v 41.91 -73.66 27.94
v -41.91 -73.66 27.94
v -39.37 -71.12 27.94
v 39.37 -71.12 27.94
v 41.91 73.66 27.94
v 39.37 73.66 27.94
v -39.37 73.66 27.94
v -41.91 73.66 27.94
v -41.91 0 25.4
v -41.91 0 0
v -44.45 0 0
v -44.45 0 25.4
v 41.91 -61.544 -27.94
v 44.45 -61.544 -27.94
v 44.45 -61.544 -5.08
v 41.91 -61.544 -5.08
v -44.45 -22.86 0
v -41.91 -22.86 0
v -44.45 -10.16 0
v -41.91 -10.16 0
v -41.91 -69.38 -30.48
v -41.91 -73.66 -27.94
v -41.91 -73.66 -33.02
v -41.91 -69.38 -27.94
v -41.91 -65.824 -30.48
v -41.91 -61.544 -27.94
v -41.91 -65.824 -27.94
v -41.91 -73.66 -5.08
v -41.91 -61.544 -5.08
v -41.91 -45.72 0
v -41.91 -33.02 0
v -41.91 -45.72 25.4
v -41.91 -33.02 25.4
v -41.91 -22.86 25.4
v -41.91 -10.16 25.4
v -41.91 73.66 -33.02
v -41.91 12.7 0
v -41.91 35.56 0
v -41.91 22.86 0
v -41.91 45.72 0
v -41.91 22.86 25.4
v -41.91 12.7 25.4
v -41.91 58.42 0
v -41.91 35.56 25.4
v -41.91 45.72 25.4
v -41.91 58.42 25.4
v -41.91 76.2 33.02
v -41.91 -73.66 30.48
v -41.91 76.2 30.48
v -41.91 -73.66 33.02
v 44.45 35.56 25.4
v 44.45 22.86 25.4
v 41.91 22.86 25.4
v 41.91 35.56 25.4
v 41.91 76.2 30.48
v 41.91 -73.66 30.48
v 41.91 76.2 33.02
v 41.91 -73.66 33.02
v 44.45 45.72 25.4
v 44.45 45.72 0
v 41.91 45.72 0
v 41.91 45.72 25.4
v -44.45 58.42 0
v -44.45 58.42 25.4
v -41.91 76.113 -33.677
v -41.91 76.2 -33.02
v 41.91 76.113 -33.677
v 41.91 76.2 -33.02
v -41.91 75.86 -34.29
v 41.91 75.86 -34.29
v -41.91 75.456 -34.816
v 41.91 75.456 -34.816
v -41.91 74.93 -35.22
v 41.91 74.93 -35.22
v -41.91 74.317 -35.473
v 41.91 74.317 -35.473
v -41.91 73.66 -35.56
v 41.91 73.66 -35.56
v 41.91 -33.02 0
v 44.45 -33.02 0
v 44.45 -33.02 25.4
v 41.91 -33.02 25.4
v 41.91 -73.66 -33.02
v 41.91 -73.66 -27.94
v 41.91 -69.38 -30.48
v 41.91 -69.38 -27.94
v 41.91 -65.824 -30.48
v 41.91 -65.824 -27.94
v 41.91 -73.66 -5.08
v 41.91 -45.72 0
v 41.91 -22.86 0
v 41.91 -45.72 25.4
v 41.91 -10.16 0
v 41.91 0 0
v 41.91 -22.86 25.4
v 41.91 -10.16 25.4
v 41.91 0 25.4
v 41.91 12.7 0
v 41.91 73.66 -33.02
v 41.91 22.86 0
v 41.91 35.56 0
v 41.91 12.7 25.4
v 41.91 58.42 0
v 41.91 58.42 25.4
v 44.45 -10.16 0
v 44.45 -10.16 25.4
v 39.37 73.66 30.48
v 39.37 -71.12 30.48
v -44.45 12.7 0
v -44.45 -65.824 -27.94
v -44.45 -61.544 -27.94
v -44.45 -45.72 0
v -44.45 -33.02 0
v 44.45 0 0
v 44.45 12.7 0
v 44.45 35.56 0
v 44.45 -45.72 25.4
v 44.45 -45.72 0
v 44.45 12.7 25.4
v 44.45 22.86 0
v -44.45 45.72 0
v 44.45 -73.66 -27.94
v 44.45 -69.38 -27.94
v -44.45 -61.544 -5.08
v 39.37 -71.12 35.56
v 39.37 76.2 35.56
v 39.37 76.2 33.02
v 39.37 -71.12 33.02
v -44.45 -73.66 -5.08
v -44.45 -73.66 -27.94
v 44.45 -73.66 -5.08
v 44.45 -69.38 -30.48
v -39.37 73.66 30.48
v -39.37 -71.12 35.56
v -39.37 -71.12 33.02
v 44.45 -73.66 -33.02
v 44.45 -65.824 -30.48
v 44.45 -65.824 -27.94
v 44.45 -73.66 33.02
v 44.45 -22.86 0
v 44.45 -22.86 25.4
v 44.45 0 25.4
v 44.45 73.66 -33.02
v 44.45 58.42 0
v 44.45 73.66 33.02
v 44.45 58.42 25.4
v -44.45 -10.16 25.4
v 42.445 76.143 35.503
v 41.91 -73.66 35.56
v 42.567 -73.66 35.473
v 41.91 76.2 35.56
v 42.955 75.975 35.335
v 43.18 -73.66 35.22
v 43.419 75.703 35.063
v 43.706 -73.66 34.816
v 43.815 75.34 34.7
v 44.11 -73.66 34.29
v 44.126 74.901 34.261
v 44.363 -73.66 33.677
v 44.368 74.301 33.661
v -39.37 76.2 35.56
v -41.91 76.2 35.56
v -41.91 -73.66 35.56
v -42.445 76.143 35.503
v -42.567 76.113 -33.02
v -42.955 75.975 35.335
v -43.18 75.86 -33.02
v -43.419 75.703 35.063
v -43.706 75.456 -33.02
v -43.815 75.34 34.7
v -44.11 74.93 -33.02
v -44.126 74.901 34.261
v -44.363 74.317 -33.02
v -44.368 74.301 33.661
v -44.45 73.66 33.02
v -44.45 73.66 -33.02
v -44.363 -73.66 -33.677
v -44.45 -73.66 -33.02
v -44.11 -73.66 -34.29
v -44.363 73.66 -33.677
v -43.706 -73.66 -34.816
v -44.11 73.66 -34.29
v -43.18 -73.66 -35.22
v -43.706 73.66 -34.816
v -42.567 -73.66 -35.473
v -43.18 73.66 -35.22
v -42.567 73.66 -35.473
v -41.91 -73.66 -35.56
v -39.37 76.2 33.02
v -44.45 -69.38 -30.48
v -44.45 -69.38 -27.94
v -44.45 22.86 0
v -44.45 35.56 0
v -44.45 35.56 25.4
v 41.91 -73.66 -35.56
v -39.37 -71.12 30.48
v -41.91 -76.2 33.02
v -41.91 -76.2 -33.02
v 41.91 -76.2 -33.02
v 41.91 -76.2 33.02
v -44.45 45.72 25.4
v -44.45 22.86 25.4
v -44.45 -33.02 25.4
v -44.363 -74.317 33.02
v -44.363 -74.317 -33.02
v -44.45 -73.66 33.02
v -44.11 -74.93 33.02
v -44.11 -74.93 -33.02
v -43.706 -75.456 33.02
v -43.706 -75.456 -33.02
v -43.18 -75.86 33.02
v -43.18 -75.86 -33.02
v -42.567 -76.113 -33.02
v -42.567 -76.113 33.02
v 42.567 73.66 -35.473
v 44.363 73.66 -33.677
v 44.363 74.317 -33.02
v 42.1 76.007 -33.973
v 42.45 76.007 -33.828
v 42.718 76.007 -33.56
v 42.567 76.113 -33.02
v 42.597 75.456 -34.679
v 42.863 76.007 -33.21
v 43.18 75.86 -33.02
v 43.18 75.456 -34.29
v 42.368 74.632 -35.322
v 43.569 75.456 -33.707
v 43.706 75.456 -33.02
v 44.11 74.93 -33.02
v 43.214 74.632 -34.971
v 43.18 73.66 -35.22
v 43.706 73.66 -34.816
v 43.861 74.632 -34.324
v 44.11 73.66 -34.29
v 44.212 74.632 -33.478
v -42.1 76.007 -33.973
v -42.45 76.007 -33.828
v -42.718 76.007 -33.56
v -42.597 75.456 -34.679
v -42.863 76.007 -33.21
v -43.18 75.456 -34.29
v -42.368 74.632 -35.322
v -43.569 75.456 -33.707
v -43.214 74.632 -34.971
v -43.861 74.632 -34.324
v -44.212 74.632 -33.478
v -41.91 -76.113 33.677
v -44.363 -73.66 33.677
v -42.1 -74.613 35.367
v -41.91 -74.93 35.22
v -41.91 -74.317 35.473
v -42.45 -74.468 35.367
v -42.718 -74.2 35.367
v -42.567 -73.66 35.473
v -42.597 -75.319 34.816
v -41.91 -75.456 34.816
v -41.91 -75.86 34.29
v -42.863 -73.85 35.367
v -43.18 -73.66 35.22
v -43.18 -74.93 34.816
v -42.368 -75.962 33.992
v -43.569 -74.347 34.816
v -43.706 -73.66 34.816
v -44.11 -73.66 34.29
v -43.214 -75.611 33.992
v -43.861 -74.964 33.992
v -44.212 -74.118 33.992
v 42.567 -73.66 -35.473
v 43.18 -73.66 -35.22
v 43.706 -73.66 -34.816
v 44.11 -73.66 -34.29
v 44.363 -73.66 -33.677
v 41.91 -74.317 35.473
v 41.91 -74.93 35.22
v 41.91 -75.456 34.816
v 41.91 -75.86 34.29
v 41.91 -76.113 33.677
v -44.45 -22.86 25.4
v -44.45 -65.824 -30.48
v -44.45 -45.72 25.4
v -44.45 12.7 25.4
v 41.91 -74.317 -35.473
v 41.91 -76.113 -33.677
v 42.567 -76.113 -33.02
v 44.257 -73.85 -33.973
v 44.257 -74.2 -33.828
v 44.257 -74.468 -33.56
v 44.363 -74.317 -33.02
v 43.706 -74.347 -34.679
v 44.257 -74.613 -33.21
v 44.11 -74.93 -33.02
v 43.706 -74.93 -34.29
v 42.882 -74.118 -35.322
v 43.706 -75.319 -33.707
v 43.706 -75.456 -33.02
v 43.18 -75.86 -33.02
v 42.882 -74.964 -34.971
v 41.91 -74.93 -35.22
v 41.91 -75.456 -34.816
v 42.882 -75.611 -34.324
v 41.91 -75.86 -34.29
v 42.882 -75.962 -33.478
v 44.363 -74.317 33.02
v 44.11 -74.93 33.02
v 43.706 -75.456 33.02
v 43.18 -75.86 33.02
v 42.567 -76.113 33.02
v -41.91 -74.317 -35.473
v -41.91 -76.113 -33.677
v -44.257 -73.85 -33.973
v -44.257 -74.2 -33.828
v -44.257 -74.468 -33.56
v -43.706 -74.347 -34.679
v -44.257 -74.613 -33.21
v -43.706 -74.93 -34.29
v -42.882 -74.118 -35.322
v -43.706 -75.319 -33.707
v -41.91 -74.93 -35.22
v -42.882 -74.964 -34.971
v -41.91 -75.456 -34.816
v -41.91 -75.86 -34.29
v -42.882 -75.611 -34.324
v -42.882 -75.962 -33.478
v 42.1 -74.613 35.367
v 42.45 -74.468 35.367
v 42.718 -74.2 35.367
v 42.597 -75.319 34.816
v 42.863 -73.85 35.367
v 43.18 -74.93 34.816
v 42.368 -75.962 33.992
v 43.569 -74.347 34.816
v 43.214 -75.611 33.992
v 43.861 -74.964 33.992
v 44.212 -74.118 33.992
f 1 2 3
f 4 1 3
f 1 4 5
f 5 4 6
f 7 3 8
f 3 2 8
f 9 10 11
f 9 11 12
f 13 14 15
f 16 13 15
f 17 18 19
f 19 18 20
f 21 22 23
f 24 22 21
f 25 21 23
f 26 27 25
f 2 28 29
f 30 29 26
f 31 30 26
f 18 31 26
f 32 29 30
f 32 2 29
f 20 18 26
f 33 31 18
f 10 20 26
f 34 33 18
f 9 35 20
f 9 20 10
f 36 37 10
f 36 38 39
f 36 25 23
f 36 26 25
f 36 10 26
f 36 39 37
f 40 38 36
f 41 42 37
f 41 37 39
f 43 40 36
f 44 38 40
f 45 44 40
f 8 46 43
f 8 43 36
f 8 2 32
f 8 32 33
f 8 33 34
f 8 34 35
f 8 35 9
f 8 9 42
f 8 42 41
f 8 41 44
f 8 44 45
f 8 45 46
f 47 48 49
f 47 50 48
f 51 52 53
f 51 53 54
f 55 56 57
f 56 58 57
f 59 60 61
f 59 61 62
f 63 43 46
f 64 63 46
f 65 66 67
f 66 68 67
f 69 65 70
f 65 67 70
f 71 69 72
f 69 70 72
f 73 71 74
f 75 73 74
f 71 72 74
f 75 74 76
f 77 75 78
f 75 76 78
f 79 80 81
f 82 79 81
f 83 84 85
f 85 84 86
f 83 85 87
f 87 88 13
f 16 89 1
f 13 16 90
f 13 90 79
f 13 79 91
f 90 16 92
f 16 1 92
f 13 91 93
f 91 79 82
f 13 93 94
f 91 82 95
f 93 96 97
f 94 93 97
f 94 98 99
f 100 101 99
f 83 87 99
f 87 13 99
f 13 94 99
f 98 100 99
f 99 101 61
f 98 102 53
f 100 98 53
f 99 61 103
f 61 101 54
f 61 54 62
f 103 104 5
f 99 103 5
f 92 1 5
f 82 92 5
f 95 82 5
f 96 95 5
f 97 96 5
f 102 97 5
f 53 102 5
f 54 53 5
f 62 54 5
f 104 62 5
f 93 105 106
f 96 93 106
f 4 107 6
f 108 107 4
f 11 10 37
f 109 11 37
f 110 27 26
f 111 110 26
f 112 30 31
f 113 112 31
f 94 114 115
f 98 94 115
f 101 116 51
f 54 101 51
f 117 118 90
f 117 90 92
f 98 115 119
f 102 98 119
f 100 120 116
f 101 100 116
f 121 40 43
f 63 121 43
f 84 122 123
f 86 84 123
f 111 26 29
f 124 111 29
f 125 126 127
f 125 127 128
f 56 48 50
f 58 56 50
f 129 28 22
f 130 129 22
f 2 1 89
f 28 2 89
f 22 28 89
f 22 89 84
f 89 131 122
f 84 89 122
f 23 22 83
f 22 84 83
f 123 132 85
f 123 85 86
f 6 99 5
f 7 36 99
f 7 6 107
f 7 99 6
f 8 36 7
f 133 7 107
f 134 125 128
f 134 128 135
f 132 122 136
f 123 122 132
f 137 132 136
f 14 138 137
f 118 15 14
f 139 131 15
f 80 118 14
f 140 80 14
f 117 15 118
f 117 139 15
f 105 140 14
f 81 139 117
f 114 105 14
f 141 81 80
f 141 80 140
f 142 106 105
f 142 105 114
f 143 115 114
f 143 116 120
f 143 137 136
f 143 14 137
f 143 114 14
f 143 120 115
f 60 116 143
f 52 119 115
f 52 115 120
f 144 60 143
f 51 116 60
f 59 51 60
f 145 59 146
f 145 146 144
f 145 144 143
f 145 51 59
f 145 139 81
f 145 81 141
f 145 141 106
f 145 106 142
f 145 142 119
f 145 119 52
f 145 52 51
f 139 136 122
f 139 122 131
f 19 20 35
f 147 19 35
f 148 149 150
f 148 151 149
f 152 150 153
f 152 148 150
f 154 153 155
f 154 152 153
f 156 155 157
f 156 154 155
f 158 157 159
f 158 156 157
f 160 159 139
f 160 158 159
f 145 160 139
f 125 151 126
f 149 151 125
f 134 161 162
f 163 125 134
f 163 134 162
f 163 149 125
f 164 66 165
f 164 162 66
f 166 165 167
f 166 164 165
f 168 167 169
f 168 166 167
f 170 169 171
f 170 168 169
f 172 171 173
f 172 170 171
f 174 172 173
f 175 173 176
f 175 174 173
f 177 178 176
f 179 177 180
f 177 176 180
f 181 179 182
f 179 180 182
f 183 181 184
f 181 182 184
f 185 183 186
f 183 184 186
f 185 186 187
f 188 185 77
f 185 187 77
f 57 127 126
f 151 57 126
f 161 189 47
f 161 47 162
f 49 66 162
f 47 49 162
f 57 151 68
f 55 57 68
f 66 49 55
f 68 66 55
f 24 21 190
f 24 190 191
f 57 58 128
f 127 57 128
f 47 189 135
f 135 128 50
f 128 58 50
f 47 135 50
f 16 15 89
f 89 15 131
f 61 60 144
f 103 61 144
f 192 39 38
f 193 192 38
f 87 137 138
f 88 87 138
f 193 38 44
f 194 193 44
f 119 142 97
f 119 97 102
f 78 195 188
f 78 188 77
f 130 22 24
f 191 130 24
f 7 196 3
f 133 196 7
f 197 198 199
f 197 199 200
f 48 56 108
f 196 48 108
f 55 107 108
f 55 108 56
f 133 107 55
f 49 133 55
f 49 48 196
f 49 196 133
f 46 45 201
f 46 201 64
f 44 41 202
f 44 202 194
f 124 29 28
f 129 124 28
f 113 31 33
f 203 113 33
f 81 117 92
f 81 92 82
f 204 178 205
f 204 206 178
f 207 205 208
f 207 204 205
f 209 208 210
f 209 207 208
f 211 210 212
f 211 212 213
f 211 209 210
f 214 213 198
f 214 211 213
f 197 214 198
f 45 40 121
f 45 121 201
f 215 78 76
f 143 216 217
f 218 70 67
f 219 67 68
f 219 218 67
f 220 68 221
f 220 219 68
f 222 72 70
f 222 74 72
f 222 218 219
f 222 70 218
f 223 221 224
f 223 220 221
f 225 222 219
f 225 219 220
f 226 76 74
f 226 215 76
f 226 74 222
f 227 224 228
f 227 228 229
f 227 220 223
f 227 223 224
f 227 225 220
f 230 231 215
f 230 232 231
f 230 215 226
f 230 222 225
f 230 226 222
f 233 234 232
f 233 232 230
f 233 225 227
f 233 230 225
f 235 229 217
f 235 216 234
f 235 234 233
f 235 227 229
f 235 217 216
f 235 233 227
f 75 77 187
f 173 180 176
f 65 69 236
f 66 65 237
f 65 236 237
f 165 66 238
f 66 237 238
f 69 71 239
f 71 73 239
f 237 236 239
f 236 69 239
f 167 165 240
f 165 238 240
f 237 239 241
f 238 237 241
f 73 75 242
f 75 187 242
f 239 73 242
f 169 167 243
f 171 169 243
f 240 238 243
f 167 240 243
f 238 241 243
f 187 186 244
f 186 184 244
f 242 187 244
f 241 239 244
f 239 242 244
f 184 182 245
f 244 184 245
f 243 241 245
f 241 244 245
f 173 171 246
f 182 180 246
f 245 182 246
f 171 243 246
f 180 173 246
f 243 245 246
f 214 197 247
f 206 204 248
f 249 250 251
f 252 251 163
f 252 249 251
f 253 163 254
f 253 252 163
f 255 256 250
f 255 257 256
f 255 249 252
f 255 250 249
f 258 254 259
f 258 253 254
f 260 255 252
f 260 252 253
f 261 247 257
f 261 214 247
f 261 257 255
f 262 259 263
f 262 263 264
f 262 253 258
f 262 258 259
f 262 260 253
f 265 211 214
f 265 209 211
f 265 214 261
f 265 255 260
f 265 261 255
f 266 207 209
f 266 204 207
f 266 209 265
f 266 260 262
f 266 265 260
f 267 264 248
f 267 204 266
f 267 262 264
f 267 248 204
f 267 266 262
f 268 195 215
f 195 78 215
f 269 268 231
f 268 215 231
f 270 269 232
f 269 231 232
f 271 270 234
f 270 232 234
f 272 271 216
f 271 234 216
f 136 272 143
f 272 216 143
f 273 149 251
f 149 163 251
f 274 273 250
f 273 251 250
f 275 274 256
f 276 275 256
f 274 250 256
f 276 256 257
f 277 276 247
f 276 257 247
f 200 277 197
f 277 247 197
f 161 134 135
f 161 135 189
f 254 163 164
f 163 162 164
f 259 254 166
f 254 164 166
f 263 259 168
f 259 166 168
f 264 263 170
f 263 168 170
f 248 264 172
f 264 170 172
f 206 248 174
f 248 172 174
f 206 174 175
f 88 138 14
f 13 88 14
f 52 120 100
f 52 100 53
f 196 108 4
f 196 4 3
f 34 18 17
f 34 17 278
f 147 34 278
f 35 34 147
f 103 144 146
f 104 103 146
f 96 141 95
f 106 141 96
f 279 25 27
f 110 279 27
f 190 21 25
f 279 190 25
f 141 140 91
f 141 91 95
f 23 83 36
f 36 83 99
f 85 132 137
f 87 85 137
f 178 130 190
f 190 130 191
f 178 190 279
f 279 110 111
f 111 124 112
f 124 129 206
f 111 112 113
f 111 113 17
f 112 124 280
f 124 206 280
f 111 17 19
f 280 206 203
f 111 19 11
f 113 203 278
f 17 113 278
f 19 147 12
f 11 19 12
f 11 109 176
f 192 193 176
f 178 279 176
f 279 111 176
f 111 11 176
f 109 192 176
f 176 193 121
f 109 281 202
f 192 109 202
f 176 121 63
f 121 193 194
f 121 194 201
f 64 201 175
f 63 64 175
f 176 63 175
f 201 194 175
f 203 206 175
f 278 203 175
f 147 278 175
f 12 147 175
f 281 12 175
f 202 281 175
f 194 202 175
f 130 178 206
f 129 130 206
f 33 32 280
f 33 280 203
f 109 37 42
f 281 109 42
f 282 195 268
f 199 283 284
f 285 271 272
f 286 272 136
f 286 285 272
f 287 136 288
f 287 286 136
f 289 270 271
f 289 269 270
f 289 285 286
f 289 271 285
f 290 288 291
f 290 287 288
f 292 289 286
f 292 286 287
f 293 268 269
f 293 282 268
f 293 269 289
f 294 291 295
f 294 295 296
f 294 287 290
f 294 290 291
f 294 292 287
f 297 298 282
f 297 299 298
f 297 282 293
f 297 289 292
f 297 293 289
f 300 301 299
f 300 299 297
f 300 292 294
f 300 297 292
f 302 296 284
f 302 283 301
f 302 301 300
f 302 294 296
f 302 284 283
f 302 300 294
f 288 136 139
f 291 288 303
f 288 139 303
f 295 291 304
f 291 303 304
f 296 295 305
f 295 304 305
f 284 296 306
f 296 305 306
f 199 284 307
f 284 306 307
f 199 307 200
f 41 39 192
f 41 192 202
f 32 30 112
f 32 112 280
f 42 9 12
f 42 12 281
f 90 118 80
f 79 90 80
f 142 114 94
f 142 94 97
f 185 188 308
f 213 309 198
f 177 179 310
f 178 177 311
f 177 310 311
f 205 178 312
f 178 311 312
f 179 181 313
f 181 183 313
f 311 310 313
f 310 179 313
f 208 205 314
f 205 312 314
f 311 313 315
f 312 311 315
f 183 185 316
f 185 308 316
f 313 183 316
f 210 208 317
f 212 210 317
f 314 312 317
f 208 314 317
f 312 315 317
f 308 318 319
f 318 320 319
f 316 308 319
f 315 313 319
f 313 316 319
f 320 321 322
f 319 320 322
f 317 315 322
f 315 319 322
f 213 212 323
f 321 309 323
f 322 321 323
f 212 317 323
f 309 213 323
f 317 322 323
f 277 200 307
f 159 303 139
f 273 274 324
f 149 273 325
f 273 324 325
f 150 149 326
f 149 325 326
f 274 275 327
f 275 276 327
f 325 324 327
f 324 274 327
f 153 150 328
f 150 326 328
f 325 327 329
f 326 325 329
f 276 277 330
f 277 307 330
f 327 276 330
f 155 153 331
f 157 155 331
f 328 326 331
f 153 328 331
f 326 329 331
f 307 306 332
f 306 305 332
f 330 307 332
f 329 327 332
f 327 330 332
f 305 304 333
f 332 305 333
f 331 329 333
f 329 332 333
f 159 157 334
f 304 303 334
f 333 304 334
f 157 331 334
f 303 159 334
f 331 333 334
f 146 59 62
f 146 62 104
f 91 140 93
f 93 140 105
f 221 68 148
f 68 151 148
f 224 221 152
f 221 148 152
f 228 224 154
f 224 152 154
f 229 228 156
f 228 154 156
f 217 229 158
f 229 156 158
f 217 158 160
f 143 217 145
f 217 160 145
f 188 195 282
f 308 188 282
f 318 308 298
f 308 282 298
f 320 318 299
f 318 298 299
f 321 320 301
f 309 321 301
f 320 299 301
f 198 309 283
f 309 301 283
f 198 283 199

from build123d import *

# Parameters (mm, degrees)
F0_W      = 152.4
F0_H      = 71.12
F1_DEPTH  = 44.45
F2_T      = -2.54
F3_W      = 2.54
F3_H      = 63.5
F4_DEPTH  = 83.82
F5_W      = 147.32
F5_H      = 2.54
F5_W_2    = 149.86
F6_DEPTH  = 2.54
F7_W      = 147.32
F7_H      = 2.54
F7_W_2    = 149.86
F8_DEPTH  = 2.54
F9_W      = 78.74
F9_H      = 2.54
F10_DEPTH = 2.54
F11_W     = 3.556
F11_H     = 2.54
F12_DEPTH = 127
F13_R     = 2.53999
F14_W     = 12.7
F14_H     = 25.4
F15_DEPTH = 254


# Not quite as in the source:
# - a fillet or chamfer is up to 0.001 mm smaller than in the source, because OpenCascade refuses the exact size


with BuildPart() as f1:
    # F0 (on Right) → F1 (new body, symmetric)
    with BuildSketch(Plane.YZ):
        Rectangle(F0_W, F0_H)
    extrude(amount=F1_DEPTH, both=True)

    # F2
    f2_openings = [f1.faces().sort_by_distance(p)[0] for p in [
        (0, 0, 35.56),
        (0, 76.2, 0),
    ]]
    offset(amount=F2_T, openings=f2_openings)

    # F3 (on face) → F4 (join, through all)
    with BuildSketch(Plane.YZ.offset(-41.91)):
        with Locations((74.93, -1.27)):
            Rectangle(F3_W, F3_H)
    extrude(amount=F4_DEPTH)

    # F5 (on face) → F6 (join)
    with BuildSketch(Plane(origin=(41.91, 0, 0), x_dir=(0, -1, 0), z_dir=(-1, 0, 0))):
        with Locations((0, 29.21)):
            Rectangle(F5_W, F5_H)
        with Locations((-1.27, 34.29)):
            Rectangle(F5_W_2, F5_H)
    extrude(amount=F6_DEPTH)

    # F7 (on face) → F8 (join)
    with BuildSketch(Plane.YZ.offset(-41.91)):
        with Locations((0, 29.21)):
            Rectangle(F7_W, F7_H)
        with Locations((1.27, 34.29)):
            Rectangle(F7_W_2, F7_H)
    extrude(amount=F8_DEPTH)

    # F9 (on face) → F10 (join)
    with BuildSketch(Plane(origin=(0, -73.66, 0), x_dir=(-1, 0, 0), z_dir=(0, 1, 0))):
        with Locations((0, 34.29)):
            Rectangle(F9_W, F9_H)
        with Locations((0, 29.21)):
            Rectangle(F9_W, F9_H)
    extrude(amount=F10_DEPTH)

    # F11 (on face) → F12 (cut, symmetric)
    with BuildSketch(Plane.YZ.offset(-41.91)):
        Polygon((-73.66, -5.08), (-73.66, -27.94), (-69.3801, -27.94), (-69.3801, -25.4), (-65.8241, -25.4), (-65.8241, -27.94), (-61.5442, -27.94), (-61.5442, -5.08), align=None)
        with Locations((-67.6021, -26.67)):
            Rectangle(F11_W, F11_H)
        with Locations((-67.6021, -29.21)):
            Rectangle(F11_W, F11_H)
    extrude(amount=F12_DEPTH, both=True, mode=Mode.SUBTRACT)

    # F13 (radius 2.54 in the source; OpenCascade refuses exactly that, so slightly less here)
    f13_edges = [f1.edges().sort_by_distance(p)[0] for p in [
        (0, -76.2, -35.56),
        (-44.45, 0, -35.56),
        (44.45, 0, -35.56),
        (44.45, -76.2, 0),
        (-44.45, -76.2, 0),
        (0, 76.2, -35.56),
        (44.45, 76.2, 0),
        (-44.45, 76.2, 0),
        (0, -76.2, 35.56),
        (44.45, 0, 35.56),
        (-44.45, 0, 35.56),
    ]]
    fillet(f13_edges, radius=F13_R)

    # F14 (on face) → F15 (cut)
    with BuildSketch(Plane.YZ.offset(44.45)):
        with Locations((-39.37, 12.7)):
            Rectangle(F14_W, F14_H)
        with Locations((-16.51, 12.7)):
            Rectangle(F14_W, F14_H)
        with Locations((6.35, 12.7)):
            Rectangle(F14_W, F14_H)
        with Locations((29.21, 12.7)):
            Rectangle(F14_W, F14_H)
        with Locations((52.07, 12.7)):
            Rectangle(F14_W, F14_H)
    extrude(amount=-F15_DEPTH, mode=Mode.SUBTRACT)


solid = f1.part
